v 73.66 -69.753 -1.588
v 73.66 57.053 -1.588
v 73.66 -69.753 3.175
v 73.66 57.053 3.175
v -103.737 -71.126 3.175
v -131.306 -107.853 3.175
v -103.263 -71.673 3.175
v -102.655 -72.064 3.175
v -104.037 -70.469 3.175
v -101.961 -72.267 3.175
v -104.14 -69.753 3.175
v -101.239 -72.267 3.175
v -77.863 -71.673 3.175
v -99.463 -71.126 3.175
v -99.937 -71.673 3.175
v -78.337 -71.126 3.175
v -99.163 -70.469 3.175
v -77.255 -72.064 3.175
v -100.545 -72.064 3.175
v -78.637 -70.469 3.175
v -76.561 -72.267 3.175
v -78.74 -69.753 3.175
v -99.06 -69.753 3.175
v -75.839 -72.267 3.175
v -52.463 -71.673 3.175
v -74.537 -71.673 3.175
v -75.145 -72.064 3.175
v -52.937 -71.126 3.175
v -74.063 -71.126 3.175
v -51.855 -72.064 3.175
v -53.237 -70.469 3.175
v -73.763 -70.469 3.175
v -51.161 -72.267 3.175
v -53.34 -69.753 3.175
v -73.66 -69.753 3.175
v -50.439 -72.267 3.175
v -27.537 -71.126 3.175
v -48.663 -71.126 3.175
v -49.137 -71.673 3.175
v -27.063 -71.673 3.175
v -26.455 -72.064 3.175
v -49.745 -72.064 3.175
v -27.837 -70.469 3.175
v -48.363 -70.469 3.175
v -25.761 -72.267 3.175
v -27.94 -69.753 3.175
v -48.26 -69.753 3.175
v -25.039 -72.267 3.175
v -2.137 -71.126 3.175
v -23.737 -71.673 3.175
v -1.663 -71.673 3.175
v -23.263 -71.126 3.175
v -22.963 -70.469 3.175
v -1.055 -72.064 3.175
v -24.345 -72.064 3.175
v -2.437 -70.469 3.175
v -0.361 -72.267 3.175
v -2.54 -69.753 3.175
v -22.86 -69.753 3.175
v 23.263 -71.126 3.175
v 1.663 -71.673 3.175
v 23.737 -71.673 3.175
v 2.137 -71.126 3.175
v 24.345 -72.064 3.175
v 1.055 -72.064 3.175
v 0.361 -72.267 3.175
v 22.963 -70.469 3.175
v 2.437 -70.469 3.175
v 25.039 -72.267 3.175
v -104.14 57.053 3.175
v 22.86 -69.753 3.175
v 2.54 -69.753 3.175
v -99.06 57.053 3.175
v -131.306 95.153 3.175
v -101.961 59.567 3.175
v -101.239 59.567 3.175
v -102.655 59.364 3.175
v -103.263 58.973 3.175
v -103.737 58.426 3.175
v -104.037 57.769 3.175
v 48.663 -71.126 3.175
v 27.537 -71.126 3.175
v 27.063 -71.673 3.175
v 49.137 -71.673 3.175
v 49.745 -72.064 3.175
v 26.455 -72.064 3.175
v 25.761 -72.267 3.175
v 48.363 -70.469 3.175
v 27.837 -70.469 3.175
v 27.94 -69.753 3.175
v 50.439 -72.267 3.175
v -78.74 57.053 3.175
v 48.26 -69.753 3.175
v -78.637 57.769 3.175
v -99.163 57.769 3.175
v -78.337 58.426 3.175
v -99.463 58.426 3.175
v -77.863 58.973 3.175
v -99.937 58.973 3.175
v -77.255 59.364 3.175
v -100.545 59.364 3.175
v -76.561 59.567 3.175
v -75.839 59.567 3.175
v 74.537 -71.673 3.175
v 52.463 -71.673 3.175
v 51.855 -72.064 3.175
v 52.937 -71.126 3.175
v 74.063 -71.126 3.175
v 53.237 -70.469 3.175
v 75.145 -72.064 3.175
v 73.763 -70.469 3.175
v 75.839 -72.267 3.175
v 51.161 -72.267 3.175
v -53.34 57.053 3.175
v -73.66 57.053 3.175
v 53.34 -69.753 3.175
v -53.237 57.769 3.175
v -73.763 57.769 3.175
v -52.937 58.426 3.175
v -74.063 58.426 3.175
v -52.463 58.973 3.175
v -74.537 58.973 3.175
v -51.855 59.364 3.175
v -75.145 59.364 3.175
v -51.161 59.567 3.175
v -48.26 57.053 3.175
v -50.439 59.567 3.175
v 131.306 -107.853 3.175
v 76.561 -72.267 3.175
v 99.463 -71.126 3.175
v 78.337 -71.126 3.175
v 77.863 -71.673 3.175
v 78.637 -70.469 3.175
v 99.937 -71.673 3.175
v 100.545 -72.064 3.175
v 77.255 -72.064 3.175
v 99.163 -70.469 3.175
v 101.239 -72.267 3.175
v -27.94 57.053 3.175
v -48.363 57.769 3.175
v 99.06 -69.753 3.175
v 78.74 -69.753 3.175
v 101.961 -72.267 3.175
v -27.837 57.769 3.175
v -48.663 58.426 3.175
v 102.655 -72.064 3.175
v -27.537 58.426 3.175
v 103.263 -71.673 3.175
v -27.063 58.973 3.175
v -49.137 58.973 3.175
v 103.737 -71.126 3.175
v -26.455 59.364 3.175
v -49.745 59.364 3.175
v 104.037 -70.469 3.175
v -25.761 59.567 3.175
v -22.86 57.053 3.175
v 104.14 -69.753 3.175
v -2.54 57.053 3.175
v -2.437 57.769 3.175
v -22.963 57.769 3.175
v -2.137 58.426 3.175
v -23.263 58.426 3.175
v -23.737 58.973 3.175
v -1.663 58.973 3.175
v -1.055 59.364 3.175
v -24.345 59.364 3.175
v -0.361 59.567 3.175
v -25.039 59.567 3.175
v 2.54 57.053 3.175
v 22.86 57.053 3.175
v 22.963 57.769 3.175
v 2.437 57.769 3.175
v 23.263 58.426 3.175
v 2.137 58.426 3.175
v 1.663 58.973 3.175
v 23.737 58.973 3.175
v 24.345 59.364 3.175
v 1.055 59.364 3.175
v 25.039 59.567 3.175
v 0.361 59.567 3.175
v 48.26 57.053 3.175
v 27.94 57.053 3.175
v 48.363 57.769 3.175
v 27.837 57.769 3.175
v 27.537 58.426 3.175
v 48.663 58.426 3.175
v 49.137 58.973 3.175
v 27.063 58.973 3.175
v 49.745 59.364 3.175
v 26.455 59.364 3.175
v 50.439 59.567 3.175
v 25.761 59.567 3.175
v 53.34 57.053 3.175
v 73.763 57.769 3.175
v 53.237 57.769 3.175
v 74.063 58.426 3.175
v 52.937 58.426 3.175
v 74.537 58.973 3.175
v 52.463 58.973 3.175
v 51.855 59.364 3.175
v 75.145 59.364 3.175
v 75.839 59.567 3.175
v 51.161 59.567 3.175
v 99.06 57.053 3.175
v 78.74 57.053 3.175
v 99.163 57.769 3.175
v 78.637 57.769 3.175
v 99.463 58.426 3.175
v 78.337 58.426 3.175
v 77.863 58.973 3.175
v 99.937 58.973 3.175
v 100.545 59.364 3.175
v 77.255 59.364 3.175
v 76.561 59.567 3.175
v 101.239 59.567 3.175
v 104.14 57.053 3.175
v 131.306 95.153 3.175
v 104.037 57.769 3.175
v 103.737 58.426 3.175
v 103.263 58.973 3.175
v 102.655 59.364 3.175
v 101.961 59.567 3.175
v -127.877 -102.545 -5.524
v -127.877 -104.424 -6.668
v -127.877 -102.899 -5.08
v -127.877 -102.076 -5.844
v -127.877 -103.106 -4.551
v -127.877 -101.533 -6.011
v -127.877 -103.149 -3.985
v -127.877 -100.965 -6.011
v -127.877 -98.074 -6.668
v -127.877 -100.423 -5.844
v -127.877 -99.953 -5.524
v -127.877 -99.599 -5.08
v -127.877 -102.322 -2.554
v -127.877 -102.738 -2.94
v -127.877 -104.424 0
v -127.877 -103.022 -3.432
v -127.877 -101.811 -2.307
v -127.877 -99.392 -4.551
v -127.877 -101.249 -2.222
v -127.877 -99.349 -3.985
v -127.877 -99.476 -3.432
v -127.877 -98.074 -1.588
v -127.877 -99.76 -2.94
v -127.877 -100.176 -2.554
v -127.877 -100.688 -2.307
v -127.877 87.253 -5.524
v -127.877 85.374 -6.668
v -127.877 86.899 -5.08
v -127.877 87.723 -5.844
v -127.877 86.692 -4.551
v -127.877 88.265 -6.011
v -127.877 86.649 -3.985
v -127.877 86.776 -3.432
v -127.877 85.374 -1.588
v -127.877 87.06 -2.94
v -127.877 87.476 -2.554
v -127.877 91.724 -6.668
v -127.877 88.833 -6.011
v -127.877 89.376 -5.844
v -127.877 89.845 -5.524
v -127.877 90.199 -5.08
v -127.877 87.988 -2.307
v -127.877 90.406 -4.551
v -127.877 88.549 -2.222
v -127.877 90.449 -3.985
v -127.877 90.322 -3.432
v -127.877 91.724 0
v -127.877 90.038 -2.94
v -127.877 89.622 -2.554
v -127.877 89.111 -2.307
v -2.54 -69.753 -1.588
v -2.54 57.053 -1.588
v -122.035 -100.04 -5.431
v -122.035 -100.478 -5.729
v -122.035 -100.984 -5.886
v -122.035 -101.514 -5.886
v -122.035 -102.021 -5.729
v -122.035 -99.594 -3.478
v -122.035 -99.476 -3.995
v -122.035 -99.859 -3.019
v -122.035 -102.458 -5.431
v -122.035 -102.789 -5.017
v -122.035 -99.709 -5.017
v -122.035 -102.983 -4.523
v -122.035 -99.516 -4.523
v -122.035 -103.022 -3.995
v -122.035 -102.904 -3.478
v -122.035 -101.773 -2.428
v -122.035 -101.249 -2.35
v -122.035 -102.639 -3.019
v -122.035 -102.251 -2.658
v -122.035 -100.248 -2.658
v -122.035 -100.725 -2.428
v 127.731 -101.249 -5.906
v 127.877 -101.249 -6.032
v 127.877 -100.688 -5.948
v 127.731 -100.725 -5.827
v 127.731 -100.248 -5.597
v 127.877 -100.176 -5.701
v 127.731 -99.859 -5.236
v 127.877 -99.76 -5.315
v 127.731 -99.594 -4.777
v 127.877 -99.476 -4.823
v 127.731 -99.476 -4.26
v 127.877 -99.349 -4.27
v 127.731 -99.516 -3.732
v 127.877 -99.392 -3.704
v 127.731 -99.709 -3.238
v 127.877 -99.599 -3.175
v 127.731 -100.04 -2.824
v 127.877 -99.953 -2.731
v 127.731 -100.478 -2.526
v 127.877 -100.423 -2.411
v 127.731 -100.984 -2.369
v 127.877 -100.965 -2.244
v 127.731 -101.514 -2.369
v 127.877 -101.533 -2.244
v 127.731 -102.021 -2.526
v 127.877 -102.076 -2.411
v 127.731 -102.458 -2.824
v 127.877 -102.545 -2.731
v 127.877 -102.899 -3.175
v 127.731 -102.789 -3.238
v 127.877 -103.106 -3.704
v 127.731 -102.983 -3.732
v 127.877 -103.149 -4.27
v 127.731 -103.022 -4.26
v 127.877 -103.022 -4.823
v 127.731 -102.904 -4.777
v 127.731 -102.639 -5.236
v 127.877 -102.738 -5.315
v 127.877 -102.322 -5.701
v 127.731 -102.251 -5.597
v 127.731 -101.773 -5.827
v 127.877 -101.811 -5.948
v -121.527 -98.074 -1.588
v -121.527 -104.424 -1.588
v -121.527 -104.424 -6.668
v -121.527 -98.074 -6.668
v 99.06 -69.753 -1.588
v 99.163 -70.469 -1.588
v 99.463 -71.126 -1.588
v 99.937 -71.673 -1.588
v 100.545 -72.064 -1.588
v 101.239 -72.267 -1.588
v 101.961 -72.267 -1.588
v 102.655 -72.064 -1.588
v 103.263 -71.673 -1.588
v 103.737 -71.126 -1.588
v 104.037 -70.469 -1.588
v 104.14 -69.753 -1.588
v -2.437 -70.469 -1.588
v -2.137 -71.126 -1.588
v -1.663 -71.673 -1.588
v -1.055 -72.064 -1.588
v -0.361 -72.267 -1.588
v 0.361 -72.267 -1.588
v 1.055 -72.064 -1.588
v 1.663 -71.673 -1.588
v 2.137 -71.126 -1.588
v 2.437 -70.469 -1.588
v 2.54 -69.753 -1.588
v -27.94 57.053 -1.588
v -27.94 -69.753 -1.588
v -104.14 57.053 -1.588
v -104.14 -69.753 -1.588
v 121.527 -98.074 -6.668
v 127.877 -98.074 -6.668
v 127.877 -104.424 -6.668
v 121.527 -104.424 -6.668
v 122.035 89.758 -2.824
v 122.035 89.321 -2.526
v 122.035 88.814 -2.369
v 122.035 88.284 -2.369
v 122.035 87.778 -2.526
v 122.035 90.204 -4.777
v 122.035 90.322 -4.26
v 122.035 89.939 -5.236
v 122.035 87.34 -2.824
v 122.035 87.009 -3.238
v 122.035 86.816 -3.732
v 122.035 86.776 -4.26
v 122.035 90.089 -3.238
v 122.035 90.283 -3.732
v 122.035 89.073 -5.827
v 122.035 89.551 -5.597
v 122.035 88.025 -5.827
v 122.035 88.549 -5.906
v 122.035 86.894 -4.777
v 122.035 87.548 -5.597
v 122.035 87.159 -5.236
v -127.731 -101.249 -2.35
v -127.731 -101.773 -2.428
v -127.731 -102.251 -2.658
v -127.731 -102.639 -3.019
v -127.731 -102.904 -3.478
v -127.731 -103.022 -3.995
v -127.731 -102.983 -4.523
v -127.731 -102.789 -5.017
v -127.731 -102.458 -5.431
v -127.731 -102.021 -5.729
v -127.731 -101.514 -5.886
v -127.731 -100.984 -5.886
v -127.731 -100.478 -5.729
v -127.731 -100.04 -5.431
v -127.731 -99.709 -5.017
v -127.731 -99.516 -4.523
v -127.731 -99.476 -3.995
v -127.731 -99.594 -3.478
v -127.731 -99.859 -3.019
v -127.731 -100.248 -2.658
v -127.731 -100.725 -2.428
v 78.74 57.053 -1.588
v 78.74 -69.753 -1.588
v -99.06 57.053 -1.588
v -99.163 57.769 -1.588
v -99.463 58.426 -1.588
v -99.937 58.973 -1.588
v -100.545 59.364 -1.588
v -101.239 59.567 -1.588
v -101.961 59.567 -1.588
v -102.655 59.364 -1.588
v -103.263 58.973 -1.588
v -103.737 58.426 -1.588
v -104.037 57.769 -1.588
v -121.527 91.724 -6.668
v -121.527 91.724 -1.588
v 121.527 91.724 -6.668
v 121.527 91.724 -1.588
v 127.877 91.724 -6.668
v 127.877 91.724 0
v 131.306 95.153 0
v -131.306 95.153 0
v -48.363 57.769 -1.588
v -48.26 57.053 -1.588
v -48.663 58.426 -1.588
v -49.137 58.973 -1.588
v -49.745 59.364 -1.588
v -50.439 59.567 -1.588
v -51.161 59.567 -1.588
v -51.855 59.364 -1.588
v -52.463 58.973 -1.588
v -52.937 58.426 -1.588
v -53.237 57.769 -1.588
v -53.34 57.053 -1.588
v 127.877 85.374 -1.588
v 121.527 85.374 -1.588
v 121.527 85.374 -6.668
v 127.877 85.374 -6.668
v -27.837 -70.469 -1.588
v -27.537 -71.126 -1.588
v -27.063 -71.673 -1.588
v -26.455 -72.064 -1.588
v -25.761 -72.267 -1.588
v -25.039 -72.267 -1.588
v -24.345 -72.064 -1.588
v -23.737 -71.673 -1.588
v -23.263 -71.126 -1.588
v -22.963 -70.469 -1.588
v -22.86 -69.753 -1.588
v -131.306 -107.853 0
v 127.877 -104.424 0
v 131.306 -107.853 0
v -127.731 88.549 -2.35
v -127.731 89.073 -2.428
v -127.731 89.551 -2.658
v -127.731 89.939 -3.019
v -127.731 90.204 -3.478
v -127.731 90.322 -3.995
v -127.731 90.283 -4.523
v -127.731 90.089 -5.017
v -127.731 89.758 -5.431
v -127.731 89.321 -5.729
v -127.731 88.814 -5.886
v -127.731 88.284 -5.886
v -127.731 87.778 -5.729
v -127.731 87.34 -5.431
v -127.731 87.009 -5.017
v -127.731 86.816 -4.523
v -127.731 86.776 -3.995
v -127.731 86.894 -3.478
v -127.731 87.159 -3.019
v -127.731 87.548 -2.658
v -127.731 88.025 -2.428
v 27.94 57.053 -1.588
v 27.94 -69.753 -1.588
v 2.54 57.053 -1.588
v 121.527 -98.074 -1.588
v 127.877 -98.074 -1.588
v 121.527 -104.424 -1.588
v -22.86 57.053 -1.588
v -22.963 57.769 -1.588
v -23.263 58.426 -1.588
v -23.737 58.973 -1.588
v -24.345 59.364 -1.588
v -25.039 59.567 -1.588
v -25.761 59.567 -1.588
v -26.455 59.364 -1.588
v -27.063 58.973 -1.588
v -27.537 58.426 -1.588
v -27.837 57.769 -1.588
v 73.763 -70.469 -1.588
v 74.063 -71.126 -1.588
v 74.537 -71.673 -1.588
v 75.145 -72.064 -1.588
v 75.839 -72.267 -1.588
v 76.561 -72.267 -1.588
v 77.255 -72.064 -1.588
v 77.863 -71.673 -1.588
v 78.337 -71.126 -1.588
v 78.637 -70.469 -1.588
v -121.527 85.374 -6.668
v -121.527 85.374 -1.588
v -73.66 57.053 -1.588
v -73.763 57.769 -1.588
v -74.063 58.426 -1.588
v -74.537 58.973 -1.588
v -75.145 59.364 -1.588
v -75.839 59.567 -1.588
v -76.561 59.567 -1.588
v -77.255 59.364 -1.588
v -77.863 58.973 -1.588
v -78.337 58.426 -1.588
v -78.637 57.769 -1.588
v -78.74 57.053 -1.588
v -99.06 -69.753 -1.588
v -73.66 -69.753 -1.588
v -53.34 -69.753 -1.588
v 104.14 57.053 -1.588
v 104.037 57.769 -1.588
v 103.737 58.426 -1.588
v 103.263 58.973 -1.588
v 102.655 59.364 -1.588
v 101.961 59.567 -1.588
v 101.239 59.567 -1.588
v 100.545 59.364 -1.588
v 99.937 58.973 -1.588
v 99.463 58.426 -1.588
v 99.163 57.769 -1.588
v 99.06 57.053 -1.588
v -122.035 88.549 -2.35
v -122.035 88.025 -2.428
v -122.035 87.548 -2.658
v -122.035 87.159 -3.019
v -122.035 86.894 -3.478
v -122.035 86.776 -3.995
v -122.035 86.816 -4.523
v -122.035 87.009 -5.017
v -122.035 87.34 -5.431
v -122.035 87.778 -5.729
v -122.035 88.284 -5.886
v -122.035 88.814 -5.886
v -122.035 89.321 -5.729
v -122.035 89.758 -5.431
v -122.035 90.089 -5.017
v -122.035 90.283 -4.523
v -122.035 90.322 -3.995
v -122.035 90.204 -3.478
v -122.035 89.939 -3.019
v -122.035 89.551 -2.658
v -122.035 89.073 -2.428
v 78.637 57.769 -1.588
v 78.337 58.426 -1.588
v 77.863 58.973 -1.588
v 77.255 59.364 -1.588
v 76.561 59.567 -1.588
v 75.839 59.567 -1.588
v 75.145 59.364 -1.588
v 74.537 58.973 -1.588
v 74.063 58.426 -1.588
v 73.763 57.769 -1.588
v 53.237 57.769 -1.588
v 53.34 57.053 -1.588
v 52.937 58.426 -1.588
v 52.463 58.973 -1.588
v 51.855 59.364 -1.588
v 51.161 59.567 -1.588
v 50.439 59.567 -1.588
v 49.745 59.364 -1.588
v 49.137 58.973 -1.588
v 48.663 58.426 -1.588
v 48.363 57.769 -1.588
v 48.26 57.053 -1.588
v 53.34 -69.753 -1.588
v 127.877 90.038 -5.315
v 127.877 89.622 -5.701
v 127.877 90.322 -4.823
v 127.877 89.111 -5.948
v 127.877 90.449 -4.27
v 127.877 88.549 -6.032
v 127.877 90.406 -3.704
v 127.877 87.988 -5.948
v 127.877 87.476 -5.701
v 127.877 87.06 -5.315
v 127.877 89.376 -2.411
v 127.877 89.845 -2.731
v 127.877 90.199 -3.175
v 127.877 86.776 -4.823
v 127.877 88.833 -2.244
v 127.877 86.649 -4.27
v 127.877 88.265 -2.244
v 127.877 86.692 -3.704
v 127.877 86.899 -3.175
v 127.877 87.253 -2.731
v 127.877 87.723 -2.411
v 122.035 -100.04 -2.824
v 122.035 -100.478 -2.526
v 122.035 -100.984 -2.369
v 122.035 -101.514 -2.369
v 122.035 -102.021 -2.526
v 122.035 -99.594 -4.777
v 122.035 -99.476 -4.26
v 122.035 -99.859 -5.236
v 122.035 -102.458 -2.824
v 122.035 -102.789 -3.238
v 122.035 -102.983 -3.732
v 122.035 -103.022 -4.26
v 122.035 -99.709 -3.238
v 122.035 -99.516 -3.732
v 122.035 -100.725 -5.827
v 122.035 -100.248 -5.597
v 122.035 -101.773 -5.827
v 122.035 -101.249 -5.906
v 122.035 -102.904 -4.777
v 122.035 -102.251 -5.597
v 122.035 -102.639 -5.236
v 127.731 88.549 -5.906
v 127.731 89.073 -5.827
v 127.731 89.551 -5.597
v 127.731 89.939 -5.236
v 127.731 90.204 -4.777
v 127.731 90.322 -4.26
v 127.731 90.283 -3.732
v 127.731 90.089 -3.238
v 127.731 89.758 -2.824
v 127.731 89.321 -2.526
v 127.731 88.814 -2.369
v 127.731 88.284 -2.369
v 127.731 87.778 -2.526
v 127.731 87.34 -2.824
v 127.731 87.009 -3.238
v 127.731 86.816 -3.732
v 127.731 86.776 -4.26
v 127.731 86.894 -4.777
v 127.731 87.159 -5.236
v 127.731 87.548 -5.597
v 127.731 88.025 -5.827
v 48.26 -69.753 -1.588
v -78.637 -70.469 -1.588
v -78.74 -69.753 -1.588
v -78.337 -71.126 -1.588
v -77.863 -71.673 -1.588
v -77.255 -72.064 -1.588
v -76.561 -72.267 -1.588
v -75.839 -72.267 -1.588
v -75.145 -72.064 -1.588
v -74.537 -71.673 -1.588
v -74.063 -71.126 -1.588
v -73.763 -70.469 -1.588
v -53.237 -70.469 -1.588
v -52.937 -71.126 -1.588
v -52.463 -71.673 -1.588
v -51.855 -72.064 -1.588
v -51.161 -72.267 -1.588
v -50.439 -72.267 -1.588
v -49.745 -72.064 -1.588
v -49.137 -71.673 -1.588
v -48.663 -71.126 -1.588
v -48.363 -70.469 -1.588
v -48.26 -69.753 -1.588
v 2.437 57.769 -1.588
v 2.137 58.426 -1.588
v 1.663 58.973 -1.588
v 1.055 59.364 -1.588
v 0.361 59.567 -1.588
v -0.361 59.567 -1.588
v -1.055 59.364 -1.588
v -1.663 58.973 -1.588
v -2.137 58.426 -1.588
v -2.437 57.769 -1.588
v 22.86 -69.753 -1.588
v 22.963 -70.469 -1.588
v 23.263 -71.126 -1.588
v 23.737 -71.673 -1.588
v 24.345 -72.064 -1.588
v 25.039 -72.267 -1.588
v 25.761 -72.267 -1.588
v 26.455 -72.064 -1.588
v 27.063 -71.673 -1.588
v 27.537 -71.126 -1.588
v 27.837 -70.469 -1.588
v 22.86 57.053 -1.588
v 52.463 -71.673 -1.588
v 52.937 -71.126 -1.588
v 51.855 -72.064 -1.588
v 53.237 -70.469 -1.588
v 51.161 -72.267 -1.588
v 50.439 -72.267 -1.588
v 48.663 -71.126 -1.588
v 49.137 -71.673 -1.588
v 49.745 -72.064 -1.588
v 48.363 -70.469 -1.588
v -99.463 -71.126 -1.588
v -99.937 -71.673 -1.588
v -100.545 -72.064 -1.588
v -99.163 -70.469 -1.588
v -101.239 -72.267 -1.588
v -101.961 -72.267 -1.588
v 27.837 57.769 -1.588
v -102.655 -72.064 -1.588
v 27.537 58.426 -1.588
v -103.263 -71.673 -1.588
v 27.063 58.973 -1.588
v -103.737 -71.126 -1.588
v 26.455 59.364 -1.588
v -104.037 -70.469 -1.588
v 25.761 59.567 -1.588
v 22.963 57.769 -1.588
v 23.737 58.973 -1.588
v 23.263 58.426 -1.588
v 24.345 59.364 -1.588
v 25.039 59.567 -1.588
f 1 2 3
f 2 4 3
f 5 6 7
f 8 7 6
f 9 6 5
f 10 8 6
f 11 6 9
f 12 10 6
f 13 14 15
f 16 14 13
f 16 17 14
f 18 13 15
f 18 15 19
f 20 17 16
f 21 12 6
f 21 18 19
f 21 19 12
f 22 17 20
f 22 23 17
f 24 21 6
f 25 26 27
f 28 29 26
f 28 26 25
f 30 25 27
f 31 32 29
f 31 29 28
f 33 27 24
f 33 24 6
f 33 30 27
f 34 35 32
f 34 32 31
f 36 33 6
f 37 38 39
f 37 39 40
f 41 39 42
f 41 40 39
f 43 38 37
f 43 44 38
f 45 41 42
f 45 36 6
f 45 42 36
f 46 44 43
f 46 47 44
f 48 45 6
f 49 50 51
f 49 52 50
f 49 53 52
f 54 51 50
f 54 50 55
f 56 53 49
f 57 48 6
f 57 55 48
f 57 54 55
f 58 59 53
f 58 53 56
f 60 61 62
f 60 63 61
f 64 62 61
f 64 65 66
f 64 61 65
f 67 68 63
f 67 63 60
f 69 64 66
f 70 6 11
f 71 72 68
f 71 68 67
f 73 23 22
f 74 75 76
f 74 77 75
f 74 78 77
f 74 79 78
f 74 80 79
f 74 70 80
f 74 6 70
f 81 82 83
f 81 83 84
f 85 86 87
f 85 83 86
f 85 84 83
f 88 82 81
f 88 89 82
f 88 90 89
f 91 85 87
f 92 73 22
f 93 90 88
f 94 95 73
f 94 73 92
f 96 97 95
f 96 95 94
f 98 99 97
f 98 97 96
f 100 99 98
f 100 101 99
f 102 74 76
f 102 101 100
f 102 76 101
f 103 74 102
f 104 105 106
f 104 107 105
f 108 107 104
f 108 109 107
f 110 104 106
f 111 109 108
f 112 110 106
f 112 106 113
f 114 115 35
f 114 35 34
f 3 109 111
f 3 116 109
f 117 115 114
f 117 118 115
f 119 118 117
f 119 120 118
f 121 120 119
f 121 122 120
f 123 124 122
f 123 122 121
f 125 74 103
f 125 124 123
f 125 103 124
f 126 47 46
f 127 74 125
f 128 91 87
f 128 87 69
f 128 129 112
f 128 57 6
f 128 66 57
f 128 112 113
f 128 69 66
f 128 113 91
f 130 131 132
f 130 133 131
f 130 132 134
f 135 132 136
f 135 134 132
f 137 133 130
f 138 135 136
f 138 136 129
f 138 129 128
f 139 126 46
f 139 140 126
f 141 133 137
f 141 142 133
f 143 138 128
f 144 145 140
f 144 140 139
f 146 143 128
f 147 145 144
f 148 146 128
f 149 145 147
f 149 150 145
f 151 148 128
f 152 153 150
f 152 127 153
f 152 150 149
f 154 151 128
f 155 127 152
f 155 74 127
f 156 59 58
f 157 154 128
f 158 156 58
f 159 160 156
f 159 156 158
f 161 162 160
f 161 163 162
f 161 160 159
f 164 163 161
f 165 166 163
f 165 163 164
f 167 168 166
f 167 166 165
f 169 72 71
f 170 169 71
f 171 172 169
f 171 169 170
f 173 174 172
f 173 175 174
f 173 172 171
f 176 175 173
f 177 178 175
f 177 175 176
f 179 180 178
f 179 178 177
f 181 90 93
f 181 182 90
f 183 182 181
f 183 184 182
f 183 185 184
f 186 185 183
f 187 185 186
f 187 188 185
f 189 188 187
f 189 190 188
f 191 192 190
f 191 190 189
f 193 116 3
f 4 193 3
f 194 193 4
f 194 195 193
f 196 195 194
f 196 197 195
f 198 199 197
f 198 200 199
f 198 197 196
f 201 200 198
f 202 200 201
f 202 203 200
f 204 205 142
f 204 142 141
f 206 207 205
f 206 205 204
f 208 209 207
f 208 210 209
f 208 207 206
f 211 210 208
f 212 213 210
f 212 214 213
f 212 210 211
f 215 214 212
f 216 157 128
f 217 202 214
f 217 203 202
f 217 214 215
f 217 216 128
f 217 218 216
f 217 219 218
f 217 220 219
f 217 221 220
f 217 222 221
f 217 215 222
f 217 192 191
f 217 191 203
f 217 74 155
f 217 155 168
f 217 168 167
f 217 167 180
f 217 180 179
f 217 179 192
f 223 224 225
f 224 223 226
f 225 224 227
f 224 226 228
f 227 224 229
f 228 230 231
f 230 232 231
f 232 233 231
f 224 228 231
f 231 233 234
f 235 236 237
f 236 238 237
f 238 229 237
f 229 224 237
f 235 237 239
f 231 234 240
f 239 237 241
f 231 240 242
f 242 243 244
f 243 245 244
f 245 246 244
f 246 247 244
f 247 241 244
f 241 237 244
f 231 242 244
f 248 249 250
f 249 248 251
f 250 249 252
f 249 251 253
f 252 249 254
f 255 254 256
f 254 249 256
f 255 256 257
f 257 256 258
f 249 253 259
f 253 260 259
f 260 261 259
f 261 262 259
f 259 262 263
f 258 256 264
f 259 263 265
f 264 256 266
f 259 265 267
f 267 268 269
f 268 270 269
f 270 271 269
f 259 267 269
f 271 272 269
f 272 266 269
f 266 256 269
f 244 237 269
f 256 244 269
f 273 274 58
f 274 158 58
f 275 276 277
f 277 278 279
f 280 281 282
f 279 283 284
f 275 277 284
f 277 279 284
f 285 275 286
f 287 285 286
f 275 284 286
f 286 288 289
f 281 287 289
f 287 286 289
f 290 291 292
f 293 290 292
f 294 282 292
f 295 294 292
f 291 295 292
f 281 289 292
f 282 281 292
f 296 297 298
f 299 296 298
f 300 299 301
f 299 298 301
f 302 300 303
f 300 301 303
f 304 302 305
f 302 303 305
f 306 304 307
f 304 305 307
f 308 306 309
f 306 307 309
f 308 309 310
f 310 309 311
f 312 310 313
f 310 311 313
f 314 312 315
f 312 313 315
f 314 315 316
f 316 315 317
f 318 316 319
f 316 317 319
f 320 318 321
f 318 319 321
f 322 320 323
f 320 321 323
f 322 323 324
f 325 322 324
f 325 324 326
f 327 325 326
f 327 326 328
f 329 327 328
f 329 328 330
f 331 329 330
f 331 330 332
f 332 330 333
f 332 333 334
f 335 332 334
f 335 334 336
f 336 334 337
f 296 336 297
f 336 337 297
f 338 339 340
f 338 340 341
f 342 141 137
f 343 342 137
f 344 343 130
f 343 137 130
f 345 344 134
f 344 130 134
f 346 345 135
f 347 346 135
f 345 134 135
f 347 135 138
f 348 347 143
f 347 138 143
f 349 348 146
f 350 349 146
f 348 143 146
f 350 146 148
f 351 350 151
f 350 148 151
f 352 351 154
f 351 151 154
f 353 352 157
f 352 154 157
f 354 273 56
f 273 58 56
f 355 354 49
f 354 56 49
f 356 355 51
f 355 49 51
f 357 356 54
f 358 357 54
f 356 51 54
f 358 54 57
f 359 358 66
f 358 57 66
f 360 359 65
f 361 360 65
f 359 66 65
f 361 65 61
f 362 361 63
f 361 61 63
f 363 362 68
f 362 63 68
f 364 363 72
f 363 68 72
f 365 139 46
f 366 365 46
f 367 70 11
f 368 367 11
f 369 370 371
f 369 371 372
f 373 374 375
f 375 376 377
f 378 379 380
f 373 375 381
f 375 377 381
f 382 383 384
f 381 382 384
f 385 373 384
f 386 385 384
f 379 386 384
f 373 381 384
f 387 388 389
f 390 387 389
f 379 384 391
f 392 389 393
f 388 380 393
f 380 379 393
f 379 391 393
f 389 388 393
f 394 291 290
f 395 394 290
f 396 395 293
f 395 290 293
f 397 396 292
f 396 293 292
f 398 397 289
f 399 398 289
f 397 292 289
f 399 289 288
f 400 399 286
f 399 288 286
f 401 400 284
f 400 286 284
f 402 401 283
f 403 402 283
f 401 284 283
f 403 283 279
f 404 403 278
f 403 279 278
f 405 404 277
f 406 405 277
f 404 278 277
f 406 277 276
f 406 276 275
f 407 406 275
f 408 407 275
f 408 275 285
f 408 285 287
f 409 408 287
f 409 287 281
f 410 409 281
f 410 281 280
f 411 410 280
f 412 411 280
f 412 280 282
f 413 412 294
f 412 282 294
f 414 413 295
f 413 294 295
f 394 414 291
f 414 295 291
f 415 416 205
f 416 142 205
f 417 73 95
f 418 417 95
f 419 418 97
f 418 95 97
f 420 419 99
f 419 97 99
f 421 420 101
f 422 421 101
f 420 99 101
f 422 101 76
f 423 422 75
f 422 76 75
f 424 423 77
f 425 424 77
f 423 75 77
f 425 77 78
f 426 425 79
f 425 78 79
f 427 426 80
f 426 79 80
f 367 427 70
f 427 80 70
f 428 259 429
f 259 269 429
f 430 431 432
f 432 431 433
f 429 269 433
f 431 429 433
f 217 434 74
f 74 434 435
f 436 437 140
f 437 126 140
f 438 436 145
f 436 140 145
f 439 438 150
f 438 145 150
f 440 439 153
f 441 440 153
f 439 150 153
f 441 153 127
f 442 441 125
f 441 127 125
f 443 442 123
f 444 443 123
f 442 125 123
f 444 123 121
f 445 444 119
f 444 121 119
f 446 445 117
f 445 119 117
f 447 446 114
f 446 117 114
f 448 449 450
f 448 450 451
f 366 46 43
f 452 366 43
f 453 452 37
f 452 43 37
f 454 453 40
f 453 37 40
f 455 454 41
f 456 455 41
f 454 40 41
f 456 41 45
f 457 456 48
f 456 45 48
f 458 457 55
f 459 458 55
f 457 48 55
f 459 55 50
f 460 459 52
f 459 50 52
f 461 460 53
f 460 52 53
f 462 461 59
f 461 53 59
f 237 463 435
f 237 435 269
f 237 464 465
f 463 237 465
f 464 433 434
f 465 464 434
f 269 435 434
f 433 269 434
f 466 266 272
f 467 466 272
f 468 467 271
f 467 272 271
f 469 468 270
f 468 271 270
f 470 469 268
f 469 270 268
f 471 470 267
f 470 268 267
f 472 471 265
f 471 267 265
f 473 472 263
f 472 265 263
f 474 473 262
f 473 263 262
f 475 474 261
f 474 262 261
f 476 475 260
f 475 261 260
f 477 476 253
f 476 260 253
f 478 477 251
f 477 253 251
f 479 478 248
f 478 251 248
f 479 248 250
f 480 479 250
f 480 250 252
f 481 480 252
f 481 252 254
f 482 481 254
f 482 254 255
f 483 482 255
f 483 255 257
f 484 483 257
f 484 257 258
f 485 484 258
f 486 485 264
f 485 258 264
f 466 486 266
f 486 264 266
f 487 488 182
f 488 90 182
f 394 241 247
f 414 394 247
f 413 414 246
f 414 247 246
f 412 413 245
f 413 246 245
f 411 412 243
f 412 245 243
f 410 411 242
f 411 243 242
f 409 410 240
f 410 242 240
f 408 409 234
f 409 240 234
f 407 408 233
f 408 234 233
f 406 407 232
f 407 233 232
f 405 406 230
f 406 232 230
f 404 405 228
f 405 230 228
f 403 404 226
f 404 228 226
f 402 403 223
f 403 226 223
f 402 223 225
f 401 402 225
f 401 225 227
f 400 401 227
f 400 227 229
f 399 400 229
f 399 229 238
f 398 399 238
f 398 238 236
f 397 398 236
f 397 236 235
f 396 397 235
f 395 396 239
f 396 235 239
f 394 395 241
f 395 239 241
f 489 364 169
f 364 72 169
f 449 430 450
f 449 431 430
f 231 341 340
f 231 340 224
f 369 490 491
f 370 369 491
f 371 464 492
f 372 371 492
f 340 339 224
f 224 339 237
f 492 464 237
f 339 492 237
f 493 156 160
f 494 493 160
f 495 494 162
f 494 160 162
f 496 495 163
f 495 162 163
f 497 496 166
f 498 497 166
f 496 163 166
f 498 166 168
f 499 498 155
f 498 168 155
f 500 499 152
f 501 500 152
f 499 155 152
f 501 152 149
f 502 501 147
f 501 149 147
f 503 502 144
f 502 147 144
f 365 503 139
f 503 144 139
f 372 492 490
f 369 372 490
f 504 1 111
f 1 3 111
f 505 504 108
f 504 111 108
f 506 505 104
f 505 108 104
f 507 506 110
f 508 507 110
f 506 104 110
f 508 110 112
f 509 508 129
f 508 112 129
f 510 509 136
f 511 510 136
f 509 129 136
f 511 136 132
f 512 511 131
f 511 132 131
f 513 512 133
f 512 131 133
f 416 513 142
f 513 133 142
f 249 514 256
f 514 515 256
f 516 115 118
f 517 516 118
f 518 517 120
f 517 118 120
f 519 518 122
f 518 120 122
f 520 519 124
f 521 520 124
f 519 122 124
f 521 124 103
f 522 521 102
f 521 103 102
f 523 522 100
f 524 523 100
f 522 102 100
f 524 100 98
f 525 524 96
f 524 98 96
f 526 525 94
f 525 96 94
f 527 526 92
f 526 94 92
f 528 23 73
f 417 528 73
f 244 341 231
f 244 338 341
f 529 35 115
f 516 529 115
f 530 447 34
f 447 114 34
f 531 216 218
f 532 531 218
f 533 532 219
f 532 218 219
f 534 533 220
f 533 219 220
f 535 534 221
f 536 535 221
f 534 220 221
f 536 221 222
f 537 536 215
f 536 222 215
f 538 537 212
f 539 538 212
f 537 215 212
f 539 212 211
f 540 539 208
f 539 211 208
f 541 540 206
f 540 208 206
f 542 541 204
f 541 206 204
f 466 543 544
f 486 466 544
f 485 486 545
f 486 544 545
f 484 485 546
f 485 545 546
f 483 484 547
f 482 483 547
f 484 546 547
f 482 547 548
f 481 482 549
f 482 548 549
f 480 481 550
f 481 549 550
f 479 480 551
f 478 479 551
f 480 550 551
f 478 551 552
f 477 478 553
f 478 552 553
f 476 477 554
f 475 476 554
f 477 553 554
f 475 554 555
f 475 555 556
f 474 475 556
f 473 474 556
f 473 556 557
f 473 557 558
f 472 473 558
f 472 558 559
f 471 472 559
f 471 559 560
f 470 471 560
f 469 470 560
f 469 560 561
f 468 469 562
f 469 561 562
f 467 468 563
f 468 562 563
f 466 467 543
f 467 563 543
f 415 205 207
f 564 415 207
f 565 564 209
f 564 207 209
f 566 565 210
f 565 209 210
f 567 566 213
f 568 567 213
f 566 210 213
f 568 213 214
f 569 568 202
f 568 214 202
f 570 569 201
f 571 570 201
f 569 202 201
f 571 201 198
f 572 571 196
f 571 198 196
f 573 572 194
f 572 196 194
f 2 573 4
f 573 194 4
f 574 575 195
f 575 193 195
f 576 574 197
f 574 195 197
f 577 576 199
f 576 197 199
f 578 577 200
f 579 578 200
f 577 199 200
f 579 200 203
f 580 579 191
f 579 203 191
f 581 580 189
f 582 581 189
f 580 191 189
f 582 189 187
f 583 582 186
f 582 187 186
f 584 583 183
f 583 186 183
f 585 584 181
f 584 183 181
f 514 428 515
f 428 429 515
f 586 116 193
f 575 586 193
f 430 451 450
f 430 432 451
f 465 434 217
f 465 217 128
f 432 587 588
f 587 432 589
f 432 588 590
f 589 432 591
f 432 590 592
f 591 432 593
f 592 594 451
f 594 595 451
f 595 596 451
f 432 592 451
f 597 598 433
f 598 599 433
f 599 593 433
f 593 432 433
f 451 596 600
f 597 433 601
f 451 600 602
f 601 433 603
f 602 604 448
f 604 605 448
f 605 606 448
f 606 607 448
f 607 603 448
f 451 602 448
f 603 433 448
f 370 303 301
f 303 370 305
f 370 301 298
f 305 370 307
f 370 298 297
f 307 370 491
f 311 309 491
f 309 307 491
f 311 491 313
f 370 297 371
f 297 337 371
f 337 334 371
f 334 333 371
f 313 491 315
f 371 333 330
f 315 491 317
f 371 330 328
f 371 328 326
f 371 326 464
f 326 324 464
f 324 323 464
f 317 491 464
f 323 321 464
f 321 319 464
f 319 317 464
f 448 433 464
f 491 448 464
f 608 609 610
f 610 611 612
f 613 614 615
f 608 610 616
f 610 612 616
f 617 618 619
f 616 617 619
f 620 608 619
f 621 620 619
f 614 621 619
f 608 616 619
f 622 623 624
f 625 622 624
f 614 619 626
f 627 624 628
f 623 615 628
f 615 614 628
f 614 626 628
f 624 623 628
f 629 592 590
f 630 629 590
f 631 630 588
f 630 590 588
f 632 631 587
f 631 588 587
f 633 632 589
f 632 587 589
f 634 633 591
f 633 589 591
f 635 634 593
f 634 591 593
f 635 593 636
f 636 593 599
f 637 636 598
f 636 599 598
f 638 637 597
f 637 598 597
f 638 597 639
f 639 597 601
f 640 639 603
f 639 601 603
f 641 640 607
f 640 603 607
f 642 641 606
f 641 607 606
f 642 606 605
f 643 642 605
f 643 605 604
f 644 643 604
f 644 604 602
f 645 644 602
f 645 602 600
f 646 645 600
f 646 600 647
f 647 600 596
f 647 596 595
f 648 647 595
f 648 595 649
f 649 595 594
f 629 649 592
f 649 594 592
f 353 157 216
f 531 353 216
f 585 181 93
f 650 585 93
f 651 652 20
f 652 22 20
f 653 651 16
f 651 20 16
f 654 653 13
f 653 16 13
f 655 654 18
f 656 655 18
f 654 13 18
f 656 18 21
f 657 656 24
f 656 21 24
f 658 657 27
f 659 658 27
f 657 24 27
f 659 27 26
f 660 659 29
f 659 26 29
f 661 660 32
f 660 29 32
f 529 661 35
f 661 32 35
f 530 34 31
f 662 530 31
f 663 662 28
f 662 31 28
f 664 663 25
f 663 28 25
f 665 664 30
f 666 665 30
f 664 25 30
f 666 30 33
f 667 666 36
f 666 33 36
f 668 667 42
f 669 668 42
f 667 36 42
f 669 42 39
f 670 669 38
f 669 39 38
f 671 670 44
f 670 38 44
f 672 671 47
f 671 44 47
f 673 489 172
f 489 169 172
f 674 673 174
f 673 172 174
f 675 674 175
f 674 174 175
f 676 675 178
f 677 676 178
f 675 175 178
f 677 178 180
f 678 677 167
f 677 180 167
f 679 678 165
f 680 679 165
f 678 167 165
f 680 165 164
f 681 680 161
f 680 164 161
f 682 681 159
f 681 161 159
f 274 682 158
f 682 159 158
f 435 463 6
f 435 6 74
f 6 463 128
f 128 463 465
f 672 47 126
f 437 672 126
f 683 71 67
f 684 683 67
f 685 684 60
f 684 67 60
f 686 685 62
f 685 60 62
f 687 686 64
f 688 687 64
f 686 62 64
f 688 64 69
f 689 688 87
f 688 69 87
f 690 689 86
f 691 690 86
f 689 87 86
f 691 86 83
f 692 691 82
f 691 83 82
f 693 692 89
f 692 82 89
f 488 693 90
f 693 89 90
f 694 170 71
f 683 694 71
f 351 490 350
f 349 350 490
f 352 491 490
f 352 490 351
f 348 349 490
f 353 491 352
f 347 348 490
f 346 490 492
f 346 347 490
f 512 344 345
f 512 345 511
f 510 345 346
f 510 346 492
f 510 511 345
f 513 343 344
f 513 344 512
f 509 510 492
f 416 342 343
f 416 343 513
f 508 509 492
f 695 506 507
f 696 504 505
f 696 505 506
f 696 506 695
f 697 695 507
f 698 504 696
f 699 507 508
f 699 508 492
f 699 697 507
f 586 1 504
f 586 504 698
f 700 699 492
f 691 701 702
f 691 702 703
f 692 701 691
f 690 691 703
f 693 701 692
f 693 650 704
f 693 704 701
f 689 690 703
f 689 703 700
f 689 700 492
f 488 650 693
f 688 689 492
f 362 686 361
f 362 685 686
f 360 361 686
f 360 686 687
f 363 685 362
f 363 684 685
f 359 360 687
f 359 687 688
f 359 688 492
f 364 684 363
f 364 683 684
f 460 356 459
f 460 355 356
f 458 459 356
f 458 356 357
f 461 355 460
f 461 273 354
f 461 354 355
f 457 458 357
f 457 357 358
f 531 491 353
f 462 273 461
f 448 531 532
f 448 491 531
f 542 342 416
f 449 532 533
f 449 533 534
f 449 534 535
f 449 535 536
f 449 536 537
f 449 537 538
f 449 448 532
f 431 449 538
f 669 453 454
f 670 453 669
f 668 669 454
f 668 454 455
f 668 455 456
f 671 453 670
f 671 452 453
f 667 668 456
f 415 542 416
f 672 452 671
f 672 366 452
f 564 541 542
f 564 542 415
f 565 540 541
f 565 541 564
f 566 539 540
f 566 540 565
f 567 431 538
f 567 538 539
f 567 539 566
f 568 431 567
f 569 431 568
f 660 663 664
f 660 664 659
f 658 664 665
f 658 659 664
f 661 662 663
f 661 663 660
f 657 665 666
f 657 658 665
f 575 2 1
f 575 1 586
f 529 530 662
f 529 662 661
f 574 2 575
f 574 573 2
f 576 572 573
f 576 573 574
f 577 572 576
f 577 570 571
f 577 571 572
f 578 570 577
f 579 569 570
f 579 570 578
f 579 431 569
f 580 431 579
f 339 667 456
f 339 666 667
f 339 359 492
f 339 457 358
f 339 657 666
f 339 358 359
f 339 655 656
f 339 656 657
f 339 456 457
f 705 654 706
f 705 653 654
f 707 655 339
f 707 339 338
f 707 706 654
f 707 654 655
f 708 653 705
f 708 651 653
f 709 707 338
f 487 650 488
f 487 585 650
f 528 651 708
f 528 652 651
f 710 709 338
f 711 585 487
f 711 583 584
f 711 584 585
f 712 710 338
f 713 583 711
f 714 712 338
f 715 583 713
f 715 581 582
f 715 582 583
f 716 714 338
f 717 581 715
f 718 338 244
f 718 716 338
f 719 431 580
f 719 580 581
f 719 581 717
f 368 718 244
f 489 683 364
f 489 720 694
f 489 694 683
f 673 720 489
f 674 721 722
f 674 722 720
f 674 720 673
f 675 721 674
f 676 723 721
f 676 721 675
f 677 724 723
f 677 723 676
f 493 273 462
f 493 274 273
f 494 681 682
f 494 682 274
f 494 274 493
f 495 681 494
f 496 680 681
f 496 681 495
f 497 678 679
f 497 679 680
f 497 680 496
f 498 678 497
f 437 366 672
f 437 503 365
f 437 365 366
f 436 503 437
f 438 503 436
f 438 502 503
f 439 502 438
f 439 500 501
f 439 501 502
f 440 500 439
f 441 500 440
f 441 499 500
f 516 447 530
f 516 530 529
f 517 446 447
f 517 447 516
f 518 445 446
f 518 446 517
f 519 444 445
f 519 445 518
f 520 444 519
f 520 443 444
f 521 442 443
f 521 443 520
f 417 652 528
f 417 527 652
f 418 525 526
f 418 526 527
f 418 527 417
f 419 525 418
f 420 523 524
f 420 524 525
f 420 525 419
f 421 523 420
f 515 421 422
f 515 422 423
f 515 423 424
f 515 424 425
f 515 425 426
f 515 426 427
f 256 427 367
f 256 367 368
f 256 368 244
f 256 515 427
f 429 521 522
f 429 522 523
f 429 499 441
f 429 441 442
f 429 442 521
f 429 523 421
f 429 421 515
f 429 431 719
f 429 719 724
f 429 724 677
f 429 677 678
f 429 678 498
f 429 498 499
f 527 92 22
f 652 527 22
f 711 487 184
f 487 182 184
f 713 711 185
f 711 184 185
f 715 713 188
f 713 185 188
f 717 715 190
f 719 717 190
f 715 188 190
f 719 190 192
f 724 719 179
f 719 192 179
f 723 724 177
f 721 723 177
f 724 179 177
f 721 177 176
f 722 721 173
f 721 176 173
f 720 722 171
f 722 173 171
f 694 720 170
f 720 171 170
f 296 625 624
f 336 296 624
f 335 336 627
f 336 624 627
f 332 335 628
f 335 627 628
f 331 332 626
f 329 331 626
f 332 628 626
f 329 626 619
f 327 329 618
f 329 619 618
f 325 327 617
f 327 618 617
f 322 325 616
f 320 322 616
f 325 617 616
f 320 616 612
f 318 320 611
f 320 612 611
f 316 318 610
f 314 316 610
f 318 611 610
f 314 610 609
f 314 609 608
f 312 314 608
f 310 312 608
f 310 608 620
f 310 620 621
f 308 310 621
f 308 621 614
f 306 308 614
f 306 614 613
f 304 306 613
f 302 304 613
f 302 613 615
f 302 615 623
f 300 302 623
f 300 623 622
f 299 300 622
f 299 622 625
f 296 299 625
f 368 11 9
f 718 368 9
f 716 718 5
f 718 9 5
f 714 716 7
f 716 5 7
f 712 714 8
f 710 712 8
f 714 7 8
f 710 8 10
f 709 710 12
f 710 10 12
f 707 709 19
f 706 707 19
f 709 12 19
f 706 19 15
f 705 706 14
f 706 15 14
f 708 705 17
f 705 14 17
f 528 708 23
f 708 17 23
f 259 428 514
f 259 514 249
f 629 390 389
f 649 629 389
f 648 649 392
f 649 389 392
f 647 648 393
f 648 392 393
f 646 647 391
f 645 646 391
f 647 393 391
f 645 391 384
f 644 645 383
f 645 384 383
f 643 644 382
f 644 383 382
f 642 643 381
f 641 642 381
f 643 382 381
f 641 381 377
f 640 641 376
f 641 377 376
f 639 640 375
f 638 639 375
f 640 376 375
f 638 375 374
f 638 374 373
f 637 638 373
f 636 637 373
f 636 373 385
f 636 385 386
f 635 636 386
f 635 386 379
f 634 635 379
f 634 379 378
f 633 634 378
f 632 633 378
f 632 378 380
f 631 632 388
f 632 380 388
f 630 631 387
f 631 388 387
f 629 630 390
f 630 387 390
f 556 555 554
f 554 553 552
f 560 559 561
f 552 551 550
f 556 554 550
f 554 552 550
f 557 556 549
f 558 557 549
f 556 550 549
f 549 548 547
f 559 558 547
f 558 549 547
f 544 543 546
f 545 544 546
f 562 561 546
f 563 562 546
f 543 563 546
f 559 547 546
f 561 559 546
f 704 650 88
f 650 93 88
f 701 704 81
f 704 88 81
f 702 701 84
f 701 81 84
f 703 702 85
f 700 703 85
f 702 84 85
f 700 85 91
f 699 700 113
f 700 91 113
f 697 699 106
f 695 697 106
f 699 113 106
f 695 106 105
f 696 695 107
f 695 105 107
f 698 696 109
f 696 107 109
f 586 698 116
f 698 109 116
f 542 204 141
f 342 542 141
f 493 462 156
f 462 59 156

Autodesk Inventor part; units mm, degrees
ref_plane "YZ Plane" through (0, 0, 0) normal (1, 0, 0) x (0, 1, 0)
ref_plane "XZ Plane" through (0, 0, 0) normal (0, 1, 0) x (-1, 0, 0)
ref_plane "XY Plane" through (0, 0, 0) normal (0, 0, 1) x (1, 0, 0)
sketch "Sketch1" plane through (0, 0, 0) normal (0, 0, 1) x (1, 0, 0)
  line L0 (131.3056, -95.1531) -> (131.3056, 95.1531)
  line L1 (131.3056, 95.1531) -> (-131.3056, 95.1531)
  line L2 (-131.3056, 95.1531) -> (-131.3056, -95.1531)
  line L3 (-131.3056, -107.8531) -> (131.3056, -107.8531) projected
  line L4 (131.3056, -95.1531) -> (131.3056, -107.8531)
  line L5 (131.3056, -107.8531) -> (-131.3056, -107.8531)
  line L6 (-131.3056, -107.8531) -> (-131.3056, -95.1531)
  point P0 (0, 0)
extrude "Extrusion1" add sketch "Sketch1" along normal blind 3.175
sketch "Sketch2" plane through (0, 0, 0) normal (0, 0, -1) x (-1, 0, 0)
  line L0 (-128.1306, -104.6781) -> (128.1306, -104.6781) projected
  line L1 (128.1306, -104.6781) -> (128.1306, 91.9781) projected
  line L2 (-128.1306, 91.9781) -> (-128.1306, -104.6781) projected
  line L3 (128.1306, 91.9781) -> (-128.1306, 91.9781) projected
  line L4 (-127.8766, 91.7241) -> (-127.8766, -104.4241)
  line L5 (-127.8766, -104.4241) -> (127.8766, -104.4241)
  line L6 (127.8766, -104.4241) -> (127.8766, 91.7241)
  line L7 (127.8766, 91.7241) -> (-127.8766, 91.7241)
  point P0 (0, 0)
  dimension "d72" = 0.254
extrude "Extrusion2" add sketch "Sketch2" along normal blind 1.5875 contours L7 L6 L5 L4
sketch "Sketch6" plane through (0, 0, 3.175) normal (0, 0, 1) x (1, 0, 0)
  line L0 (0, -69.7531) -> (0, 57.0531) construction
  line L1 (2.54, -69.7531) -> (2.54, 57.0531)
  line L2 (-2.54, 57.0531) -> (-2.54, -69.7531)
  arc A0 (-2.54, -69.7531) -> (2.54, -69.7531) centre (0, -69.7531) ccw
  arc A1 (2.54, 57.0531) -> (-2.54, 57.0531) centre (0, 57.0531) ccw
  line L3 (131.3056, 95.1531) -> (-131.3056, 95.1531) projected
  line L4 (131.3056, -107.8531) -> (131.3056, 95.1531) projected
  line L5 (131.3056, 95.1531) -> (-131.3056, 95.1531) projected
  line L6 (-131.3056, 95.1531) -> (-131.3056, -107.8531) projected
  arc A2 (-22.86, 57.0531) -> (-27.94, 57.0531) centre (-25.4, 57.0531) ccw
  line L7 (-27.94, 57.0531) -> (-27.94, -69.7531)
  line L8 (-22.86, -69.7531) -> (-22.86, 57.0531)
  arc A3 (-27.94, -69.7531) -> (-22.86, -69.7531) centre (-25.4, -69.7531) ccw
  arc A4 (-48.26, 57.0531) -> (-53.34, 57.0531) centre (-50.8, 57.0531) ccw
  line L9 (-53.34, 57.0531) -> (-53.34, -69.7531)
  line L10 (-48.26, -69.7531) -> (-48.26, 57.0531)
  arc A5 (-53.34, -69.7531) -> (-48.26, -69.7531) centre (-50.8, -69.7531) ccw
  arc A6 (-73.66, 57.0531) -> (-78.74, 57.0531) centre (-76.2, 57.0531) ccw
  line L11 (-78.74, 57.0531) -> (-78.74, -69.7531)
  line L12 (-73.66, -69.7531) -> (-73.66, 57.0531)
  arc A7 (-78.74, -69.7531) -> (-73.66, -69.7531) centre (-76.2, -69.7531) ccw
  arc A8 (-99.06, 57.0531) -> (-104.14, 57.0531) centre (-101.6, 57.0531) ccw
  line L13 (-104.14, 57.0531) -> (-104.14, -69.7531)
  line L14 (-99.06, -69.7531) -> (-99.06, 57.0531)
  arc A9 (-104.14, -69.7531) -> (-99.06, -69.7531) centre (-101.6, -69.7531) ccw
  arc A10 (27.94, 57.0531) -> (22.86, 57.0531) centre (25.4, 57.0531) ccw
  line L15 (22.86, 57.0531) -> (22.86, -69.7531)
  line L16 (27.94, -69.7531) -> (27.94, 57.0531)
  arc A11 (22.86, -69.7531) -> (27.94, -69.7531) centre (25.4, -69.7531) ccw
  arc A12 (2.54, 57.0531) -> (-2.54, 57.0531) centre (0, 57.0531) ccw
  line L17 (-2.54, 57.0531) -> (-2.54, -69.7531)
  line L18 (2.54, -69.7531) -> (2.54, 57.0531)
  arc A13 (-2.54, -69.7531) -> (2.54, -69.7531) centre (0, -69.7531) ccw
  arc A14 (-22.86, 57.0531) -> (-27.94, 57.0531) centre (-25.4, 57.0531) ccw
  line L19 (-27.94, 57.0531) -> (-27.94, -69.7531)
  line L20 (-22.86, -69.7531) -> (-22.86, 57.0531)
  arc A15 (-27.94, -69.7531) -> (-22.86, -69.7531) centre (-25.4, -69.7531) ccw
  arc A16 (-48.26, 57.0531) -> (-53.34, 57.0531) centre (-50.8, 57.0531) ccw
  line L21 (-53.34, 57.0531) -> (-53.34, -69.7531)
  line L22 (-48.26, -69.7531) -> (-48.26, 57.0531)
  arc A17 (-53.34, -69.7531) -> (-48.26, -69.7531) centre (-50.8, -69.7531) ccw
  arc A18 (-73.66, 57.0531) -> (-78.74, 57.0531) centre (-76.2, 57.0531) ccw
  line L23 (-78.74, 57.0531) -> (-78.74, -69.7531)
  line L24 (-73.66, -69.7531) -> (-73.66, 57.0531)
  arc A19 (-78.74, -69.7531) -> (-73.66, -69.7531) centre (-76.2, -69.7531) ccw
  arc A20 (53.34, 57.0531) -> (48.26, 57.0531) centre (50.8, 57.0531) ccw
  line L25 (48.26, 57.0531) -> (48.26, -69.7531)
  line L26 (53.34, -69.7531) -> (53.34, 57.0531)
  arc A21 (48.26, -69.7531) -> (53.34, -69.7531) centre (50.8, -69.7531) ccw
  arc A22 (27.94, 57.0531) -> (22.86, 57.0531) centre (25.4, 57.0531) ccw
  line L27 (22.86, 57.0531) -> (22.86, -69.7531)
  line L28 (27.94, -69.7531) -> (27.94, 57.0531)
  arc A23 (22.86, -69.7531) -> (27.94, -69.7531) centre (25.4, -69.7531) ccw
  arc A24 (2.54, 57.0531) -> (-2.54, 57.0531) centre (0, 57.0531) ccw
  line L29 (-2.54, 57.0531) -> (-2.54, -69.7531)
  line L30 (2.54, -69.7531) -> (2.54, 57.0531)
  arc A25 (-2.54, -69.7531) -> (2.54, -69.7531) centre (0, -69.7531) ccw
  arc A26 (-22.86, 57.0531) -> (-27.94, 57.0531) centre (-25.4, 57.0531) ccw
  line L31 (-27.94, 57.0531) -> (-27.94, -69.7531)
  line L32 (-22.86, -69.7531) -> (-22.86, 57.0531)
  arc A27 (-27.94, -69.7531) -> (-22.86, -69.7531) centre (-25.4, -69.7531) ccw
  arc A28 (-48.26, 57.0531) -> (-53.34, 57.0531) centre (-50.8, 57.0531) ccw
  line L33 (-53.34, 57.0531) -> (-53.34, -69.7531)
  line L34 (-48.26, -69.7531) -> (-48.26, 57.0531)
  arc A29 (-53.34, -69.7531) -> (-48.26, -69.7531) centre (-50.8, -69.7531) ccw
  arc A30 (78.74, 57.0531) -> (73.66, 57.0531) centre (76.2, 57.0531) ccw
  line L35 (73.66, 57.0531) -> (73.66, -69.7531)
  line L36 (78.74, -69.7531) -> (78.74, 57.0531)
  arc A31 (73.66, -69.7531) -> (78.74, -69.7531) centre (76.2, -69.7531) ccw
  arc A32 (53.34, 57.0531) -> (48.26, 57.0531) centre (50.8, 57.0531) ccw
  line L37 (48.26, 57.0531) -> (48.26, -69.7531)
  line L38 (53.34, -69.7531) -> (53.34, 57.0531)
  arc A33 (48.26, -69.7531) -> (53.34, -69.7531) centre (50.8, -69.7531) ccw
  arc A34 (27.94, 57.0531) -> (22.86, 57.0531) centre (25.4, 57.0531) ccw
  line L39 (22.86, 57.0531) -> (22.86, -69.7531)
  line L40 (27.94, -69.7531) -> (27.94, 57.0531)
  arc A35 (22.86, -69.7531) -> (27.94, -69.7531) centre (25.4, -69.7531) ccw
  arc A36 (2.54, 57.0531) -> (-2.54, 57.0531) centre (0, 57.0531) ccw
  line L41 (-2.54, 57.0531) -> (-2.54, -69.7531)
  line L42 (2.54, -69.7531) -> (2.54, 57.0531)
  arc A37 (-2.54, -69.7531) -> (2.54, -69.7531) centre (0, -69.7531) ccw
  arc A38 (-22.86, 57.0531) -> (-27.94, 57.0531) centre (-25.4, 57.0531) ccw
  line L43 (-27.94, 57.0531) -> (-27.94, -69.7531)
  line L44 (-22.86, -69.7531) -> (-22.86, 57.0531)
  arc A39 (-27.94, -69.7531) -> (-22.86, -69.7531) centre (-25.4, -69.7531) ccw
  arc A40 (104.14, 57.0531) -> (99.06, 57.0531) centre (101.6, 57.0531) ccw
  line L45 (99.06, 57.0531) -> (99.06, -69.7531)
  line L46 (104.14, -69.7531) -> (104.14, 57.0531)
  arc A41 (99.06, -69.7531) -> (104.14, -69.7531) centre (101.6, -69.7531) ccw
  arc A42 (78.74, 57.0531) -> (73.66, 57.0531) centre (76.2, 57.0531) ccw
  line L47 (73.66, 57.0531) -> (73.66, -69.7531)
  line L48 (78.74, -69.7531) -> (78.74, 57.0531)
  arc A43 (73.66, -69.7531) -> (78.74, -69.7531) centre (76.2, -69.7531) ccw
  arc A44 (53.34, 57.0531) -> (48.26, 57.0531) centre (50.8, 57.0531) ccw
  line L49 (48.26, 57.0531) -> (48.26, -69.7531)
  line L50 (53.34, -69.7531) -> (53.34, 57.0531)
  arc A45 (48.26, -69.7531) -> (53.34, -69.7531) centre (50.8, -69.7531) ccw
  arc A46 (27.94, 57.0531) -> (22.86, 57.0531) centre (25.4, 57.0531) ccw
  line L51 (22.86, 57.0531) -> (22.86, -69.7531)
  line L52 (27.94, -69.7531) -> (27.94, 57.0531)
  arc A47 (22.86, -69.7531) -> (27.94, -69.7531) centre (25.4, -69.7531) ccw
  arc A48 (2.54, 57.0531) -> (-2.54, 57.0531) centre (0, 57.0531) ccw
  line L53 (-2.54, 57.0531) -> (-2.54, -69.7531)
  line L54 (2.54, -69.7531) -> (2.54, 57.0531)
  arc A49 (-2.54, -69.7531) -> (2.54, -69.7531) centre (0, -69.7531) ccw
  line L55 (-131.3056, -107.8531) -> (131.3056, -107.8531) projected
  dimension "d28" = 5.08
  dimension "d31" = 25.4
  dimension "d34" = 25.4
  dimension "d110" = 203.0062
  dimension "d112" = 38.1
  dimension "d113" = 38.1
extrude "Extrusion4" cut sketch "Sketch6" against normal up to surface (4.7625 mm away) contours A0 L2 A1 L1 | L8 A3 L7 A2 | L10 A5 L9 A4 | L12 A7 L11 A6 | L14 A9 L13 A8 | L16 A11 L15 A10 | L26 A21 L25 A20 | L36 A31 L35 A30 | L46 A41 L45 A40
sketch "Sketch7" plane through (0, 0, -1.5875) normal (0, 0, -1) x (-1, 0, 0)
  line L0 (-127.8766, 91.7241) -> (-121.5266, 91.7241)
  line L1 (-121.5266, 91.7241) -> (-121.5266, 85.3741)
  line L2 (-121.5266, 85.3741) -> (-127.8766, 85.3741)
  line L3 (-127.8766, 85.3741) -> (-127.8766, 91.7241)
  line L4 (-127.8766, -104.4241) -> (-121.5266, -104.4241)
  line L5 (-121.5266, -104.4241) -> (-121.5266, -98.0741)
  line L6 (-121.5266, -98.0741) -> (-127.8766, -98.0741)
  line L7 (-127.8766, -98.0741) -> (-127.8766, -104.4241)
  line L8 (127.8766, 91.7241) -> (121.5266, 91.7241)
  line L9 (121.5266, 91.7241) -> (121.5266, 85.3741)
  line L10 (121.5266, 85.3741) -> (127.8766, 85.3741)
  line L11 (127.8766, 85.3741) -> (127.8766, 91.7241)
  line L12 (127.8766, -104.4241) -> (121.5266, -104.4241)
  line L13 (121.5266, -104.4241) -> (121.5266, -98.0741)
  line L14 (121.5266, -98.0741) -> (127.8766, -98.0741)
  line L15 (127.8766, -98.0741) -> (127.8766, -104.4241)
  line L16 (127.8766, -104.4241) -> (127.8766, 91.7241) projected
  line L17 (-127.8766, -104.4241) -> (127.8766, -104.4241) projected
  line L18 (127.8766, 91.7241) -> (-127.8766, 91.7241) projected
  line L19 (-127.8766, 91.7241) -> (-127.8766, -104.4241) projected
  point P0 (0, 0)
  dimension "d40" = 6.35
  dimension "d41" = 6.35
  dimension "d42" = 6.35
  dimension "d43" = 6.35
  dimension "d44" = 6.35
  dimension "d45" = 6.35
  dimension "d46" = 6.35
  dimension "d47" = 6.35
  dimension "d73" = 0
  dimension "d74" = 0
  dimension "d75" = 0
  dimension "d76" = 0
extrude "Extrusion5" add sketch "Sketch7" along normal blind 5.08 contours L0 L1 L2 L3 | L8 L11 L10 L9 | L6 L5 L4 L7 | L15 L12 L13 L14
sketch "Sketch11" plane through (-127.8766, -104.4241, 0) normal (-1, 0, 0) x (0, 0, 1)
  line L0 (-1.5875, 189.7982) -> (-6.6675, 189.7982) projected
  line L1 (0, 196.1482) -> (-6.6675, 196.1482) projected
  line L2 (-1.5875, 189.7982) -> (-6.6675, 196.1482)
  line L3 (-1.5875, 6.35) -> (-1.5875, 189.7982) projected
  line L4 (0, 0) -> (-6.6675, 0) projected
  line L5 (-1.5875, 6.35) -> (-6.6675, 0)
  point P0 (0, 104.4241)
  point P1 (-4.1275, 3.175)
  point P2 (-4.1275, 192.9732)
sketch "Sketch12" plane through (127.8766, -104.4241, 0) normal (1, 0, 0) x (0, 0, -1)
  point P0 (0, 104.4241)
  point P1 (4.1275, 3.175)
  point P2 (4.1275, 192.9732)
hole "Hole5" at (-127.8766, 88.5491, -4.1275) at (-127.8766, -101.2491, -4.1275) direction (1, 0, 0) diameter 3.556 depth 5.842 countersink diameter 3.81 countersink angle 82
hole "Hole6" at (127.8766, -101.2491, -4.1275) at (127.8766, 88.5491, -4.1275) direction (-1, 0, 0) diameter 3.556 depth 5.842 countersink diameter 3.81 countersink angle 82
ref_plane "Work Plane1" through (13.1569, -107.8531, 0) normal (-1, 0, 0) x (0, 0, 1)
sketch "Sketch13" plane through (13.1569, -107.8531, 0) normal (-1, 0, 0) x (0, 0, 1)
  line L0 (0, 203.0062) -> (3.175, 203.0062) projected
  line L1 (0, 0) -> (3.175, 0) projected
  line L2 (0, 0) -> (0, 203.0062) projected
  line L3 (3.175, 0) -> (3.175, 203.0062) projected
  line L4 (0, 0) -> (3.175, 0)
  line L5 (3.175, 0) -> (3.175, 1.5875)
  line L6 (3.175, 1.5875) -> (0, 1.5875)
  line L7 (0, 1.5875) -> (0, 0)
  line L8 (3.175, 38.1) -> (3.175, 164.9062) projected
  line L9 (0, 3.429) -> (0, 199.5772) projected
  line L10 (0, 101.5031) -> (3.175, 101.5031)
  circle A0 centre (1.5875, 1.5875) radius 1.016
  circle A1 centre (1.5875, 101.5031) radius 1.016
  line L11 (1.5875, 1.5875) -> (1.5875, 0)
  line L12 (1.5875, 101.5031) -> (1.5875, 1.5875)
  circle A2 centre (1.5875, 51.5453) radius 1.016
  circle A3 centre (1.5875, 201.4187) radius 1.016
  circle A4 centre (1.5875, 151.4609) radius 1.016
  point P0 (0, 107.8531)
  dimension "d92" = 1.5875
  dimension "d93" = 2.032
  dimension "d94" = 2.032
  dimension "d95" = 2.032
sketch "Sketch14" plane through (13.1569, -107.8531, 0) normal (-1, 0, 0) x (0, 0, 1)
  circle A0 centre (1.5875, 201.4187) radius 1.016 projected
  circle A1 centre (1.5875, 151.4609) radius 1.016 projected
  circle A2 centre (1.5875, 101.5031) radius 1.016 projected
  circle A3 centre (1.5875, 51.5453) radius 1.016 projected
  circle A4 centre (1.5875, 1.5875) radius 1.016 projected
  circle A5 centre (1.5875, 1.5875) radius 1.143
  circle A6 centre (1.5875, 51.5453) radius 1.143
  circle A7 centre (1.5875, 101.5031) radius 1.143
  circle A8 centre (1.5875, 151.4609) radius 1.143
  circle A9 centre (1.5875, 201.4187) radius 1.143
  point P0 (0, 107.8531)
  dimension "d96" = 0.127
  dimension "d97" = 0.127
  dimension "d98" = 0.127
  dimension "d99" = 0.127
  dimension "d100" = 0.127
sketch "Sketch15" plane through (0, 0, 3.175) normal (0, 0, 1) x (1, 0, 0)
  line L0 (13.1569, -107.8531) -> (13.1569, 95.1531) projected
  arc A0 (48.26, -69.7531) -> (53.34, -69.7531) centre (50.8, -69.7531) ccw projected
  line L1 (48.26, -69.7531) -> (48.26, 57.0531) projected
  arc A1 (53.34, 57.0531) -> (48.26, 57.0531) centre (50.8, 57.0531) ccw projected
  line L2 (53.34, 57.0531) -> (53.34, -69.7531) projected
  line L3 (104.14, 57.0531) -> (104.14, -69.7531) projected
  arc A2 (99.06, -69.7531) -> (104.14, -69.7531) centre (101.6, -69.7531) ccw projected
  line L4 (99.06, -69.7531) -> (99.06, 57.0531) projected
  arc A3 (104.14, 57.0531) -> (99.06, 57.0531) centre (101.6, 57.0531) ccw projected
  line L5 (2.54, 57.0531) -> (2.54, -69.7531) projected
  arc A4 (-2.54, -69.7531) -> (2.54, -69.7531) centre (0, -69.7531) ccw projected
  line L6 (-2.54, -69.7531) -> (-2.54, 57.0531) projected
  arc A5 (2.54, 57.0531) -> (-2.54, 57.0531) centre (0, 57.0531) ccw projected
  arc A6 (-99.06, 57.0531) -> (-104.14, 57.0531) centre (-101.6, 57.0531) ccw projected
  line L7 (-99.06, 57.0531) -> (-99.06, -69.7531) projected
  arc A7 (-104.14, -69.7531) -> (-99.06, -69.7531) centre (-101.6, -69.7531) ccw projected
  line L8 (-104.14, -69.7531) -> (-104.14, 57.0531) projected
  arc A8 (-22.86, 57.0531) -> (-27.94, 57.0531) centre (-25.4, 57.0531) ccw projected
  line L9 (-22.86, 57.0531) -> (-22.86, -69.7531) projected
  arc A9 (-27.94, -69.7531) -> (-22.86, -69.7531) centre (-25.4, -69.7531) ccw projected
  line L10 (-27.94, -69.7531) -> (-27.94, 57.0531) projected
  line L11 (73.66, -69.7531) -> (73.66, 57.0531) projected
  arc A10 (78.74, 57.0531) -> (73.66, 57.0531) centre (76.2, 57.0531) ccw projected
  line L12 (78.74, 57.0531) -> (78.74, -69.7531) projected
  arc A11 (73.66, -69.7531) -> (78.74, -69.7531) centre (76.2, -69.7531) ccw projected
  arc A12 (27.94, 57.0531) -> (22.86, 57.0531) centre (25.4, 57.0531) ccw projected
  line L13 (27.94, 57.0531) -> (27.94, -69.7531) projected
  arc A13 (22.86, -69.7531) -> (27.94, -69.7531) centre (25.4, -69.7531) ccw projected
  line L14 (22.86, -69.7531) -> (22.86, 57.0531) projected
  line L15 (-78.74, -69.7531) -> (-78.74, 57.0531) projected
  arc A14 (-73.66, 57.0531) -> (-78.74, 57.0531) centre (-76.2, 57.0531) ccw projected
  line L16 (-73.66, 57.0531) -> (-73.66, -69.7531) projected
  arc A15 (-78.74, -69.7531) -> (-73.66, -69.7531) centre (-76.2, -69.7531) ccw projected
  line L17 (-53.34, -69.7531) -> (-53.34, 57.0531) projected
  arc A16 (-48.26, 57.0531) -> (-53.34, 57.0531) centre (-50.8, 57.0531) ccw projected
  line L18 (-48.26, 57.0531) -> (-48.26, -69.7531) projected
  arc A17 (-53.34, -69.7531) -> (-48.26, -69.7531) centre (-50.8, -69.7531) ccw projected
  line L19 (-131.3056, 95.1531) -> (-131.3056, -107.8531) projected
  line L20 (-131.3056, -107.8531) -> (131.3056, -107.8531) projected
  line L21 (131.3056, -107.8531) -> (131.3056, 95.1531) projected
  line L22 (131.3056, 95.1531) -> (-131.3056, 95.1531) projected
  point P0 (0, 0)
  point P1 (13.1569, 95.1531)
properties part number "RSA_TOP" material "PC/ABS Plastic"
